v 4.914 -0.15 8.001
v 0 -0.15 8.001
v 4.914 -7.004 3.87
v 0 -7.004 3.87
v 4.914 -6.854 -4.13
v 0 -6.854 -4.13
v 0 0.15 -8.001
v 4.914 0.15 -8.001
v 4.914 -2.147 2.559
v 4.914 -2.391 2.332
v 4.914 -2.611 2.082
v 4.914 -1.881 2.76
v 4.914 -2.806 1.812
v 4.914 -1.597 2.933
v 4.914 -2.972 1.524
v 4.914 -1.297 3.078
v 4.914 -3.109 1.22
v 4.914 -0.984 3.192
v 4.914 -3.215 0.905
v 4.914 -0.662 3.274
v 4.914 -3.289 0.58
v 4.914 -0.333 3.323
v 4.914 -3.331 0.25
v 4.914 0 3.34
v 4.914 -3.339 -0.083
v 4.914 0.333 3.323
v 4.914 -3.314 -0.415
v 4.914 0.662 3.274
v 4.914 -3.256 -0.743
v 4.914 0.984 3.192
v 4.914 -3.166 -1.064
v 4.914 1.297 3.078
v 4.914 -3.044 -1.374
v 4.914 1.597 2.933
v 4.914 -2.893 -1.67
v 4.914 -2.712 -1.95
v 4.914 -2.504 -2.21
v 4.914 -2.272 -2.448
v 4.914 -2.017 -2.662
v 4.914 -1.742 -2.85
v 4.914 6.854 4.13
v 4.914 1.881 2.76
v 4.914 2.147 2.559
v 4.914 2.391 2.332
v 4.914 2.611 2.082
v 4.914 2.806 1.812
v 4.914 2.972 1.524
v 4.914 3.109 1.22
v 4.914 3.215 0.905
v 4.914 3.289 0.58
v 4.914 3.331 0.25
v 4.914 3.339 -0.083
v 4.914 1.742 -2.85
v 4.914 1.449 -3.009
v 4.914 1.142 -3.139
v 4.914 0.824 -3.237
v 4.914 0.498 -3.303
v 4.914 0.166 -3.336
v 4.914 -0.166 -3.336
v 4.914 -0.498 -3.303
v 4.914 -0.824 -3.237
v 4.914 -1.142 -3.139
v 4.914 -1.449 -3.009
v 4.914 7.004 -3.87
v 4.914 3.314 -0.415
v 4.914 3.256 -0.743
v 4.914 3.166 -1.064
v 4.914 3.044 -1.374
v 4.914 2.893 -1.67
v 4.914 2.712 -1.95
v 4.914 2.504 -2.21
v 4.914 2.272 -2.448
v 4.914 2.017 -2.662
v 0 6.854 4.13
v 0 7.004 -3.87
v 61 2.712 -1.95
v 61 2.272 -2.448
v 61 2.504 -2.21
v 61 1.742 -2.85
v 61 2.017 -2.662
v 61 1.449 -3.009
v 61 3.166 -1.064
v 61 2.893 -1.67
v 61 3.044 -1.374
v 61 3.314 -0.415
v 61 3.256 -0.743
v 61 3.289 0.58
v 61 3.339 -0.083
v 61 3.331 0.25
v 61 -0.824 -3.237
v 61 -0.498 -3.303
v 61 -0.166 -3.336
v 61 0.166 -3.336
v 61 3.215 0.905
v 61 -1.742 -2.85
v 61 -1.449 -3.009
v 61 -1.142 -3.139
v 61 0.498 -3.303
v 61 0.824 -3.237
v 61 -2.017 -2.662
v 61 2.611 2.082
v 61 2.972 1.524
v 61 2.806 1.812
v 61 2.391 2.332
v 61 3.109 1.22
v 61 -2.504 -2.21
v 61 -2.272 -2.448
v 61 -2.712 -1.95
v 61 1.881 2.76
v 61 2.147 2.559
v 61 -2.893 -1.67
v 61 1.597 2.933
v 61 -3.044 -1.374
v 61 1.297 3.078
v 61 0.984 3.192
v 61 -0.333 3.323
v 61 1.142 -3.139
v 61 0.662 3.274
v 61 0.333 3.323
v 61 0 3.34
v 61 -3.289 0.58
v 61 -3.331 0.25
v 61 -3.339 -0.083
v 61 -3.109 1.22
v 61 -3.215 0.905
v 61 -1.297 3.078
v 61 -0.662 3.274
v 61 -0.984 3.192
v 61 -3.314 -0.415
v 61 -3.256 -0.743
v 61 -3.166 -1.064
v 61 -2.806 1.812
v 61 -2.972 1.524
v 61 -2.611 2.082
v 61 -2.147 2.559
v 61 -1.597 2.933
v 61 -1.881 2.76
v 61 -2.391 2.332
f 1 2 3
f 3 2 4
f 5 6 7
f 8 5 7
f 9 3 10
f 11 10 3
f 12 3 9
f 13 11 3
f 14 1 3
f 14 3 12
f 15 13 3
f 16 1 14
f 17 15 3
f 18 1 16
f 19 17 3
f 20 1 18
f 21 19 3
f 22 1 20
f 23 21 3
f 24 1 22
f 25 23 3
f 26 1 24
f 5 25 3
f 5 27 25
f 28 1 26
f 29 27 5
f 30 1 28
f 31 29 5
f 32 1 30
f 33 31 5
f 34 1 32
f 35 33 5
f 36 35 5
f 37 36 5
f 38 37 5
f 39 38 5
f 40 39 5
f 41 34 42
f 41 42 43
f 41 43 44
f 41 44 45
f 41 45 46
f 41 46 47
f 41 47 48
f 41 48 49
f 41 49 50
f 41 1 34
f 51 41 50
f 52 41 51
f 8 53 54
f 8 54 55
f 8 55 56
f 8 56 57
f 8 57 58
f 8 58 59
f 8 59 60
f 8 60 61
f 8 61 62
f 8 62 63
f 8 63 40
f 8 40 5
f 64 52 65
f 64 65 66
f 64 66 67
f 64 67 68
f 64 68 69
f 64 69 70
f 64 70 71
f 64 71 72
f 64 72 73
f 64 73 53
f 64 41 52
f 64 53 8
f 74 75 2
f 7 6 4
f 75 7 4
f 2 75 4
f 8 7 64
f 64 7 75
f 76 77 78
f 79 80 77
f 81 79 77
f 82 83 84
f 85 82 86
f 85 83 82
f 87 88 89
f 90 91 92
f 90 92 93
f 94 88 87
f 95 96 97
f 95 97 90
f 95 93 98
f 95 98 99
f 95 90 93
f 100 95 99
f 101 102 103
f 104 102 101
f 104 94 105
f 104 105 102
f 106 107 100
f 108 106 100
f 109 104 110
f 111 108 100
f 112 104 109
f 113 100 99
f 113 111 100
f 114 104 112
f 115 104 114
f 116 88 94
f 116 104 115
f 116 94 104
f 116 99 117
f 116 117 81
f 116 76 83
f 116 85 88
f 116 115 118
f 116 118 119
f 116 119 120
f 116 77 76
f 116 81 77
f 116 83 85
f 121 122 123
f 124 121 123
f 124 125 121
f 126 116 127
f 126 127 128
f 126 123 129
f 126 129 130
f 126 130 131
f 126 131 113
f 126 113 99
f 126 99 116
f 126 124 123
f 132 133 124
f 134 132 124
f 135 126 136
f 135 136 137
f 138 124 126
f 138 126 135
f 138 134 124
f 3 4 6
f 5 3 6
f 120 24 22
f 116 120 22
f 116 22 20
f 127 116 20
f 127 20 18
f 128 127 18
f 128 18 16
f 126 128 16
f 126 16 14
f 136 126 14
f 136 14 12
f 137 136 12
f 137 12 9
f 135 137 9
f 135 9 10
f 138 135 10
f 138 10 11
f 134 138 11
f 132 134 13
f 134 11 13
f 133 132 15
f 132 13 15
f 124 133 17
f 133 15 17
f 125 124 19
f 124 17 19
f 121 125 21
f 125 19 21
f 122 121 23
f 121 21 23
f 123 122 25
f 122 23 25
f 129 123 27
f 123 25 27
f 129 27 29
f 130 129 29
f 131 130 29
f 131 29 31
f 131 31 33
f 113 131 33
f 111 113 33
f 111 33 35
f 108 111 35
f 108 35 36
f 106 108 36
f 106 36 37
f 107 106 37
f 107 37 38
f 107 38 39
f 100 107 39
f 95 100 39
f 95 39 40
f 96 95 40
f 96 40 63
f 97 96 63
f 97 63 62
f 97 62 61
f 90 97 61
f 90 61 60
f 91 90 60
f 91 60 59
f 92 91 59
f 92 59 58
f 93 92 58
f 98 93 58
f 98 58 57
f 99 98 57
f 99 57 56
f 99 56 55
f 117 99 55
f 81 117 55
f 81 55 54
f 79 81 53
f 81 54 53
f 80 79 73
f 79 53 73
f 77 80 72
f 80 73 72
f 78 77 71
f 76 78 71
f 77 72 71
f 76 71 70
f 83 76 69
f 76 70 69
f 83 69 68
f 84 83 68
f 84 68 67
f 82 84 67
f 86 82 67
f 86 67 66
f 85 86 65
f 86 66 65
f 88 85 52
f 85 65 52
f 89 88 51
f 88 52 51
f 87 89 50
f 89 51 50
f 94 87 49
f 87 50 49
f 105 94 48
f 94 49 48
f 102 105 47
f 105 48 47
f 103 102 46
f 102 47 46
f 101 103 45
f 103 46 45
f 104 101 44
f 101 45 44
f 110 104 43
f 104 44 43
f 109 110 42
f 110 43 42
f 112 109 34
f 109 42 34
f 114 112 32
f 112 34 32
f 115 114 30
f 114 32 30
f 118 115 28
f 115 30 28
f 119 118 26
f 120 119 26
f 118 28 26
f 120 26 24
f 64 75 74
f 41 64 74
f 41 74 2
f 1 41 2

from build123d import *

# Parameters (mm, degrees)
BOSS_EXTRUDE1_DEPTH = 4.913831128
SKETCH1_3_R         = 3.34
BOSS_EXTRUDE2_DEPTH = 61


with BuildPart() as part:
    # Sketch1 → Boss-Extrude1 (new body)
    with BuildSketch(Plane(origin=(0, 0, 0), x_dir=(0, 0, -1), z_dir=(1, 0, 0))):
        Polygon((-3.870438982, -7.003777701), (4.130229921, -6.853787333), (8.000668903, 0.149990369), (3.870438982, 7.003777701), (-4.130229921, 6.853787333), (-8.000668903, -0.149990369), align=None)
    extrude(amount=BOSS_EXTRUDE1_DEPTH)

    # Sketch1<3> → Boss-Extrude2 (add)
    with BuildSketch(Plane(origin=(0, 0, 0), x_dir=(0, 0, -1), z_dir=(1, 0, 0))):
        Circle(SKETCH1_3_R)
    extrude(amount=BOSS_EXTRUDE2_DEPTH)


solid = part.part
